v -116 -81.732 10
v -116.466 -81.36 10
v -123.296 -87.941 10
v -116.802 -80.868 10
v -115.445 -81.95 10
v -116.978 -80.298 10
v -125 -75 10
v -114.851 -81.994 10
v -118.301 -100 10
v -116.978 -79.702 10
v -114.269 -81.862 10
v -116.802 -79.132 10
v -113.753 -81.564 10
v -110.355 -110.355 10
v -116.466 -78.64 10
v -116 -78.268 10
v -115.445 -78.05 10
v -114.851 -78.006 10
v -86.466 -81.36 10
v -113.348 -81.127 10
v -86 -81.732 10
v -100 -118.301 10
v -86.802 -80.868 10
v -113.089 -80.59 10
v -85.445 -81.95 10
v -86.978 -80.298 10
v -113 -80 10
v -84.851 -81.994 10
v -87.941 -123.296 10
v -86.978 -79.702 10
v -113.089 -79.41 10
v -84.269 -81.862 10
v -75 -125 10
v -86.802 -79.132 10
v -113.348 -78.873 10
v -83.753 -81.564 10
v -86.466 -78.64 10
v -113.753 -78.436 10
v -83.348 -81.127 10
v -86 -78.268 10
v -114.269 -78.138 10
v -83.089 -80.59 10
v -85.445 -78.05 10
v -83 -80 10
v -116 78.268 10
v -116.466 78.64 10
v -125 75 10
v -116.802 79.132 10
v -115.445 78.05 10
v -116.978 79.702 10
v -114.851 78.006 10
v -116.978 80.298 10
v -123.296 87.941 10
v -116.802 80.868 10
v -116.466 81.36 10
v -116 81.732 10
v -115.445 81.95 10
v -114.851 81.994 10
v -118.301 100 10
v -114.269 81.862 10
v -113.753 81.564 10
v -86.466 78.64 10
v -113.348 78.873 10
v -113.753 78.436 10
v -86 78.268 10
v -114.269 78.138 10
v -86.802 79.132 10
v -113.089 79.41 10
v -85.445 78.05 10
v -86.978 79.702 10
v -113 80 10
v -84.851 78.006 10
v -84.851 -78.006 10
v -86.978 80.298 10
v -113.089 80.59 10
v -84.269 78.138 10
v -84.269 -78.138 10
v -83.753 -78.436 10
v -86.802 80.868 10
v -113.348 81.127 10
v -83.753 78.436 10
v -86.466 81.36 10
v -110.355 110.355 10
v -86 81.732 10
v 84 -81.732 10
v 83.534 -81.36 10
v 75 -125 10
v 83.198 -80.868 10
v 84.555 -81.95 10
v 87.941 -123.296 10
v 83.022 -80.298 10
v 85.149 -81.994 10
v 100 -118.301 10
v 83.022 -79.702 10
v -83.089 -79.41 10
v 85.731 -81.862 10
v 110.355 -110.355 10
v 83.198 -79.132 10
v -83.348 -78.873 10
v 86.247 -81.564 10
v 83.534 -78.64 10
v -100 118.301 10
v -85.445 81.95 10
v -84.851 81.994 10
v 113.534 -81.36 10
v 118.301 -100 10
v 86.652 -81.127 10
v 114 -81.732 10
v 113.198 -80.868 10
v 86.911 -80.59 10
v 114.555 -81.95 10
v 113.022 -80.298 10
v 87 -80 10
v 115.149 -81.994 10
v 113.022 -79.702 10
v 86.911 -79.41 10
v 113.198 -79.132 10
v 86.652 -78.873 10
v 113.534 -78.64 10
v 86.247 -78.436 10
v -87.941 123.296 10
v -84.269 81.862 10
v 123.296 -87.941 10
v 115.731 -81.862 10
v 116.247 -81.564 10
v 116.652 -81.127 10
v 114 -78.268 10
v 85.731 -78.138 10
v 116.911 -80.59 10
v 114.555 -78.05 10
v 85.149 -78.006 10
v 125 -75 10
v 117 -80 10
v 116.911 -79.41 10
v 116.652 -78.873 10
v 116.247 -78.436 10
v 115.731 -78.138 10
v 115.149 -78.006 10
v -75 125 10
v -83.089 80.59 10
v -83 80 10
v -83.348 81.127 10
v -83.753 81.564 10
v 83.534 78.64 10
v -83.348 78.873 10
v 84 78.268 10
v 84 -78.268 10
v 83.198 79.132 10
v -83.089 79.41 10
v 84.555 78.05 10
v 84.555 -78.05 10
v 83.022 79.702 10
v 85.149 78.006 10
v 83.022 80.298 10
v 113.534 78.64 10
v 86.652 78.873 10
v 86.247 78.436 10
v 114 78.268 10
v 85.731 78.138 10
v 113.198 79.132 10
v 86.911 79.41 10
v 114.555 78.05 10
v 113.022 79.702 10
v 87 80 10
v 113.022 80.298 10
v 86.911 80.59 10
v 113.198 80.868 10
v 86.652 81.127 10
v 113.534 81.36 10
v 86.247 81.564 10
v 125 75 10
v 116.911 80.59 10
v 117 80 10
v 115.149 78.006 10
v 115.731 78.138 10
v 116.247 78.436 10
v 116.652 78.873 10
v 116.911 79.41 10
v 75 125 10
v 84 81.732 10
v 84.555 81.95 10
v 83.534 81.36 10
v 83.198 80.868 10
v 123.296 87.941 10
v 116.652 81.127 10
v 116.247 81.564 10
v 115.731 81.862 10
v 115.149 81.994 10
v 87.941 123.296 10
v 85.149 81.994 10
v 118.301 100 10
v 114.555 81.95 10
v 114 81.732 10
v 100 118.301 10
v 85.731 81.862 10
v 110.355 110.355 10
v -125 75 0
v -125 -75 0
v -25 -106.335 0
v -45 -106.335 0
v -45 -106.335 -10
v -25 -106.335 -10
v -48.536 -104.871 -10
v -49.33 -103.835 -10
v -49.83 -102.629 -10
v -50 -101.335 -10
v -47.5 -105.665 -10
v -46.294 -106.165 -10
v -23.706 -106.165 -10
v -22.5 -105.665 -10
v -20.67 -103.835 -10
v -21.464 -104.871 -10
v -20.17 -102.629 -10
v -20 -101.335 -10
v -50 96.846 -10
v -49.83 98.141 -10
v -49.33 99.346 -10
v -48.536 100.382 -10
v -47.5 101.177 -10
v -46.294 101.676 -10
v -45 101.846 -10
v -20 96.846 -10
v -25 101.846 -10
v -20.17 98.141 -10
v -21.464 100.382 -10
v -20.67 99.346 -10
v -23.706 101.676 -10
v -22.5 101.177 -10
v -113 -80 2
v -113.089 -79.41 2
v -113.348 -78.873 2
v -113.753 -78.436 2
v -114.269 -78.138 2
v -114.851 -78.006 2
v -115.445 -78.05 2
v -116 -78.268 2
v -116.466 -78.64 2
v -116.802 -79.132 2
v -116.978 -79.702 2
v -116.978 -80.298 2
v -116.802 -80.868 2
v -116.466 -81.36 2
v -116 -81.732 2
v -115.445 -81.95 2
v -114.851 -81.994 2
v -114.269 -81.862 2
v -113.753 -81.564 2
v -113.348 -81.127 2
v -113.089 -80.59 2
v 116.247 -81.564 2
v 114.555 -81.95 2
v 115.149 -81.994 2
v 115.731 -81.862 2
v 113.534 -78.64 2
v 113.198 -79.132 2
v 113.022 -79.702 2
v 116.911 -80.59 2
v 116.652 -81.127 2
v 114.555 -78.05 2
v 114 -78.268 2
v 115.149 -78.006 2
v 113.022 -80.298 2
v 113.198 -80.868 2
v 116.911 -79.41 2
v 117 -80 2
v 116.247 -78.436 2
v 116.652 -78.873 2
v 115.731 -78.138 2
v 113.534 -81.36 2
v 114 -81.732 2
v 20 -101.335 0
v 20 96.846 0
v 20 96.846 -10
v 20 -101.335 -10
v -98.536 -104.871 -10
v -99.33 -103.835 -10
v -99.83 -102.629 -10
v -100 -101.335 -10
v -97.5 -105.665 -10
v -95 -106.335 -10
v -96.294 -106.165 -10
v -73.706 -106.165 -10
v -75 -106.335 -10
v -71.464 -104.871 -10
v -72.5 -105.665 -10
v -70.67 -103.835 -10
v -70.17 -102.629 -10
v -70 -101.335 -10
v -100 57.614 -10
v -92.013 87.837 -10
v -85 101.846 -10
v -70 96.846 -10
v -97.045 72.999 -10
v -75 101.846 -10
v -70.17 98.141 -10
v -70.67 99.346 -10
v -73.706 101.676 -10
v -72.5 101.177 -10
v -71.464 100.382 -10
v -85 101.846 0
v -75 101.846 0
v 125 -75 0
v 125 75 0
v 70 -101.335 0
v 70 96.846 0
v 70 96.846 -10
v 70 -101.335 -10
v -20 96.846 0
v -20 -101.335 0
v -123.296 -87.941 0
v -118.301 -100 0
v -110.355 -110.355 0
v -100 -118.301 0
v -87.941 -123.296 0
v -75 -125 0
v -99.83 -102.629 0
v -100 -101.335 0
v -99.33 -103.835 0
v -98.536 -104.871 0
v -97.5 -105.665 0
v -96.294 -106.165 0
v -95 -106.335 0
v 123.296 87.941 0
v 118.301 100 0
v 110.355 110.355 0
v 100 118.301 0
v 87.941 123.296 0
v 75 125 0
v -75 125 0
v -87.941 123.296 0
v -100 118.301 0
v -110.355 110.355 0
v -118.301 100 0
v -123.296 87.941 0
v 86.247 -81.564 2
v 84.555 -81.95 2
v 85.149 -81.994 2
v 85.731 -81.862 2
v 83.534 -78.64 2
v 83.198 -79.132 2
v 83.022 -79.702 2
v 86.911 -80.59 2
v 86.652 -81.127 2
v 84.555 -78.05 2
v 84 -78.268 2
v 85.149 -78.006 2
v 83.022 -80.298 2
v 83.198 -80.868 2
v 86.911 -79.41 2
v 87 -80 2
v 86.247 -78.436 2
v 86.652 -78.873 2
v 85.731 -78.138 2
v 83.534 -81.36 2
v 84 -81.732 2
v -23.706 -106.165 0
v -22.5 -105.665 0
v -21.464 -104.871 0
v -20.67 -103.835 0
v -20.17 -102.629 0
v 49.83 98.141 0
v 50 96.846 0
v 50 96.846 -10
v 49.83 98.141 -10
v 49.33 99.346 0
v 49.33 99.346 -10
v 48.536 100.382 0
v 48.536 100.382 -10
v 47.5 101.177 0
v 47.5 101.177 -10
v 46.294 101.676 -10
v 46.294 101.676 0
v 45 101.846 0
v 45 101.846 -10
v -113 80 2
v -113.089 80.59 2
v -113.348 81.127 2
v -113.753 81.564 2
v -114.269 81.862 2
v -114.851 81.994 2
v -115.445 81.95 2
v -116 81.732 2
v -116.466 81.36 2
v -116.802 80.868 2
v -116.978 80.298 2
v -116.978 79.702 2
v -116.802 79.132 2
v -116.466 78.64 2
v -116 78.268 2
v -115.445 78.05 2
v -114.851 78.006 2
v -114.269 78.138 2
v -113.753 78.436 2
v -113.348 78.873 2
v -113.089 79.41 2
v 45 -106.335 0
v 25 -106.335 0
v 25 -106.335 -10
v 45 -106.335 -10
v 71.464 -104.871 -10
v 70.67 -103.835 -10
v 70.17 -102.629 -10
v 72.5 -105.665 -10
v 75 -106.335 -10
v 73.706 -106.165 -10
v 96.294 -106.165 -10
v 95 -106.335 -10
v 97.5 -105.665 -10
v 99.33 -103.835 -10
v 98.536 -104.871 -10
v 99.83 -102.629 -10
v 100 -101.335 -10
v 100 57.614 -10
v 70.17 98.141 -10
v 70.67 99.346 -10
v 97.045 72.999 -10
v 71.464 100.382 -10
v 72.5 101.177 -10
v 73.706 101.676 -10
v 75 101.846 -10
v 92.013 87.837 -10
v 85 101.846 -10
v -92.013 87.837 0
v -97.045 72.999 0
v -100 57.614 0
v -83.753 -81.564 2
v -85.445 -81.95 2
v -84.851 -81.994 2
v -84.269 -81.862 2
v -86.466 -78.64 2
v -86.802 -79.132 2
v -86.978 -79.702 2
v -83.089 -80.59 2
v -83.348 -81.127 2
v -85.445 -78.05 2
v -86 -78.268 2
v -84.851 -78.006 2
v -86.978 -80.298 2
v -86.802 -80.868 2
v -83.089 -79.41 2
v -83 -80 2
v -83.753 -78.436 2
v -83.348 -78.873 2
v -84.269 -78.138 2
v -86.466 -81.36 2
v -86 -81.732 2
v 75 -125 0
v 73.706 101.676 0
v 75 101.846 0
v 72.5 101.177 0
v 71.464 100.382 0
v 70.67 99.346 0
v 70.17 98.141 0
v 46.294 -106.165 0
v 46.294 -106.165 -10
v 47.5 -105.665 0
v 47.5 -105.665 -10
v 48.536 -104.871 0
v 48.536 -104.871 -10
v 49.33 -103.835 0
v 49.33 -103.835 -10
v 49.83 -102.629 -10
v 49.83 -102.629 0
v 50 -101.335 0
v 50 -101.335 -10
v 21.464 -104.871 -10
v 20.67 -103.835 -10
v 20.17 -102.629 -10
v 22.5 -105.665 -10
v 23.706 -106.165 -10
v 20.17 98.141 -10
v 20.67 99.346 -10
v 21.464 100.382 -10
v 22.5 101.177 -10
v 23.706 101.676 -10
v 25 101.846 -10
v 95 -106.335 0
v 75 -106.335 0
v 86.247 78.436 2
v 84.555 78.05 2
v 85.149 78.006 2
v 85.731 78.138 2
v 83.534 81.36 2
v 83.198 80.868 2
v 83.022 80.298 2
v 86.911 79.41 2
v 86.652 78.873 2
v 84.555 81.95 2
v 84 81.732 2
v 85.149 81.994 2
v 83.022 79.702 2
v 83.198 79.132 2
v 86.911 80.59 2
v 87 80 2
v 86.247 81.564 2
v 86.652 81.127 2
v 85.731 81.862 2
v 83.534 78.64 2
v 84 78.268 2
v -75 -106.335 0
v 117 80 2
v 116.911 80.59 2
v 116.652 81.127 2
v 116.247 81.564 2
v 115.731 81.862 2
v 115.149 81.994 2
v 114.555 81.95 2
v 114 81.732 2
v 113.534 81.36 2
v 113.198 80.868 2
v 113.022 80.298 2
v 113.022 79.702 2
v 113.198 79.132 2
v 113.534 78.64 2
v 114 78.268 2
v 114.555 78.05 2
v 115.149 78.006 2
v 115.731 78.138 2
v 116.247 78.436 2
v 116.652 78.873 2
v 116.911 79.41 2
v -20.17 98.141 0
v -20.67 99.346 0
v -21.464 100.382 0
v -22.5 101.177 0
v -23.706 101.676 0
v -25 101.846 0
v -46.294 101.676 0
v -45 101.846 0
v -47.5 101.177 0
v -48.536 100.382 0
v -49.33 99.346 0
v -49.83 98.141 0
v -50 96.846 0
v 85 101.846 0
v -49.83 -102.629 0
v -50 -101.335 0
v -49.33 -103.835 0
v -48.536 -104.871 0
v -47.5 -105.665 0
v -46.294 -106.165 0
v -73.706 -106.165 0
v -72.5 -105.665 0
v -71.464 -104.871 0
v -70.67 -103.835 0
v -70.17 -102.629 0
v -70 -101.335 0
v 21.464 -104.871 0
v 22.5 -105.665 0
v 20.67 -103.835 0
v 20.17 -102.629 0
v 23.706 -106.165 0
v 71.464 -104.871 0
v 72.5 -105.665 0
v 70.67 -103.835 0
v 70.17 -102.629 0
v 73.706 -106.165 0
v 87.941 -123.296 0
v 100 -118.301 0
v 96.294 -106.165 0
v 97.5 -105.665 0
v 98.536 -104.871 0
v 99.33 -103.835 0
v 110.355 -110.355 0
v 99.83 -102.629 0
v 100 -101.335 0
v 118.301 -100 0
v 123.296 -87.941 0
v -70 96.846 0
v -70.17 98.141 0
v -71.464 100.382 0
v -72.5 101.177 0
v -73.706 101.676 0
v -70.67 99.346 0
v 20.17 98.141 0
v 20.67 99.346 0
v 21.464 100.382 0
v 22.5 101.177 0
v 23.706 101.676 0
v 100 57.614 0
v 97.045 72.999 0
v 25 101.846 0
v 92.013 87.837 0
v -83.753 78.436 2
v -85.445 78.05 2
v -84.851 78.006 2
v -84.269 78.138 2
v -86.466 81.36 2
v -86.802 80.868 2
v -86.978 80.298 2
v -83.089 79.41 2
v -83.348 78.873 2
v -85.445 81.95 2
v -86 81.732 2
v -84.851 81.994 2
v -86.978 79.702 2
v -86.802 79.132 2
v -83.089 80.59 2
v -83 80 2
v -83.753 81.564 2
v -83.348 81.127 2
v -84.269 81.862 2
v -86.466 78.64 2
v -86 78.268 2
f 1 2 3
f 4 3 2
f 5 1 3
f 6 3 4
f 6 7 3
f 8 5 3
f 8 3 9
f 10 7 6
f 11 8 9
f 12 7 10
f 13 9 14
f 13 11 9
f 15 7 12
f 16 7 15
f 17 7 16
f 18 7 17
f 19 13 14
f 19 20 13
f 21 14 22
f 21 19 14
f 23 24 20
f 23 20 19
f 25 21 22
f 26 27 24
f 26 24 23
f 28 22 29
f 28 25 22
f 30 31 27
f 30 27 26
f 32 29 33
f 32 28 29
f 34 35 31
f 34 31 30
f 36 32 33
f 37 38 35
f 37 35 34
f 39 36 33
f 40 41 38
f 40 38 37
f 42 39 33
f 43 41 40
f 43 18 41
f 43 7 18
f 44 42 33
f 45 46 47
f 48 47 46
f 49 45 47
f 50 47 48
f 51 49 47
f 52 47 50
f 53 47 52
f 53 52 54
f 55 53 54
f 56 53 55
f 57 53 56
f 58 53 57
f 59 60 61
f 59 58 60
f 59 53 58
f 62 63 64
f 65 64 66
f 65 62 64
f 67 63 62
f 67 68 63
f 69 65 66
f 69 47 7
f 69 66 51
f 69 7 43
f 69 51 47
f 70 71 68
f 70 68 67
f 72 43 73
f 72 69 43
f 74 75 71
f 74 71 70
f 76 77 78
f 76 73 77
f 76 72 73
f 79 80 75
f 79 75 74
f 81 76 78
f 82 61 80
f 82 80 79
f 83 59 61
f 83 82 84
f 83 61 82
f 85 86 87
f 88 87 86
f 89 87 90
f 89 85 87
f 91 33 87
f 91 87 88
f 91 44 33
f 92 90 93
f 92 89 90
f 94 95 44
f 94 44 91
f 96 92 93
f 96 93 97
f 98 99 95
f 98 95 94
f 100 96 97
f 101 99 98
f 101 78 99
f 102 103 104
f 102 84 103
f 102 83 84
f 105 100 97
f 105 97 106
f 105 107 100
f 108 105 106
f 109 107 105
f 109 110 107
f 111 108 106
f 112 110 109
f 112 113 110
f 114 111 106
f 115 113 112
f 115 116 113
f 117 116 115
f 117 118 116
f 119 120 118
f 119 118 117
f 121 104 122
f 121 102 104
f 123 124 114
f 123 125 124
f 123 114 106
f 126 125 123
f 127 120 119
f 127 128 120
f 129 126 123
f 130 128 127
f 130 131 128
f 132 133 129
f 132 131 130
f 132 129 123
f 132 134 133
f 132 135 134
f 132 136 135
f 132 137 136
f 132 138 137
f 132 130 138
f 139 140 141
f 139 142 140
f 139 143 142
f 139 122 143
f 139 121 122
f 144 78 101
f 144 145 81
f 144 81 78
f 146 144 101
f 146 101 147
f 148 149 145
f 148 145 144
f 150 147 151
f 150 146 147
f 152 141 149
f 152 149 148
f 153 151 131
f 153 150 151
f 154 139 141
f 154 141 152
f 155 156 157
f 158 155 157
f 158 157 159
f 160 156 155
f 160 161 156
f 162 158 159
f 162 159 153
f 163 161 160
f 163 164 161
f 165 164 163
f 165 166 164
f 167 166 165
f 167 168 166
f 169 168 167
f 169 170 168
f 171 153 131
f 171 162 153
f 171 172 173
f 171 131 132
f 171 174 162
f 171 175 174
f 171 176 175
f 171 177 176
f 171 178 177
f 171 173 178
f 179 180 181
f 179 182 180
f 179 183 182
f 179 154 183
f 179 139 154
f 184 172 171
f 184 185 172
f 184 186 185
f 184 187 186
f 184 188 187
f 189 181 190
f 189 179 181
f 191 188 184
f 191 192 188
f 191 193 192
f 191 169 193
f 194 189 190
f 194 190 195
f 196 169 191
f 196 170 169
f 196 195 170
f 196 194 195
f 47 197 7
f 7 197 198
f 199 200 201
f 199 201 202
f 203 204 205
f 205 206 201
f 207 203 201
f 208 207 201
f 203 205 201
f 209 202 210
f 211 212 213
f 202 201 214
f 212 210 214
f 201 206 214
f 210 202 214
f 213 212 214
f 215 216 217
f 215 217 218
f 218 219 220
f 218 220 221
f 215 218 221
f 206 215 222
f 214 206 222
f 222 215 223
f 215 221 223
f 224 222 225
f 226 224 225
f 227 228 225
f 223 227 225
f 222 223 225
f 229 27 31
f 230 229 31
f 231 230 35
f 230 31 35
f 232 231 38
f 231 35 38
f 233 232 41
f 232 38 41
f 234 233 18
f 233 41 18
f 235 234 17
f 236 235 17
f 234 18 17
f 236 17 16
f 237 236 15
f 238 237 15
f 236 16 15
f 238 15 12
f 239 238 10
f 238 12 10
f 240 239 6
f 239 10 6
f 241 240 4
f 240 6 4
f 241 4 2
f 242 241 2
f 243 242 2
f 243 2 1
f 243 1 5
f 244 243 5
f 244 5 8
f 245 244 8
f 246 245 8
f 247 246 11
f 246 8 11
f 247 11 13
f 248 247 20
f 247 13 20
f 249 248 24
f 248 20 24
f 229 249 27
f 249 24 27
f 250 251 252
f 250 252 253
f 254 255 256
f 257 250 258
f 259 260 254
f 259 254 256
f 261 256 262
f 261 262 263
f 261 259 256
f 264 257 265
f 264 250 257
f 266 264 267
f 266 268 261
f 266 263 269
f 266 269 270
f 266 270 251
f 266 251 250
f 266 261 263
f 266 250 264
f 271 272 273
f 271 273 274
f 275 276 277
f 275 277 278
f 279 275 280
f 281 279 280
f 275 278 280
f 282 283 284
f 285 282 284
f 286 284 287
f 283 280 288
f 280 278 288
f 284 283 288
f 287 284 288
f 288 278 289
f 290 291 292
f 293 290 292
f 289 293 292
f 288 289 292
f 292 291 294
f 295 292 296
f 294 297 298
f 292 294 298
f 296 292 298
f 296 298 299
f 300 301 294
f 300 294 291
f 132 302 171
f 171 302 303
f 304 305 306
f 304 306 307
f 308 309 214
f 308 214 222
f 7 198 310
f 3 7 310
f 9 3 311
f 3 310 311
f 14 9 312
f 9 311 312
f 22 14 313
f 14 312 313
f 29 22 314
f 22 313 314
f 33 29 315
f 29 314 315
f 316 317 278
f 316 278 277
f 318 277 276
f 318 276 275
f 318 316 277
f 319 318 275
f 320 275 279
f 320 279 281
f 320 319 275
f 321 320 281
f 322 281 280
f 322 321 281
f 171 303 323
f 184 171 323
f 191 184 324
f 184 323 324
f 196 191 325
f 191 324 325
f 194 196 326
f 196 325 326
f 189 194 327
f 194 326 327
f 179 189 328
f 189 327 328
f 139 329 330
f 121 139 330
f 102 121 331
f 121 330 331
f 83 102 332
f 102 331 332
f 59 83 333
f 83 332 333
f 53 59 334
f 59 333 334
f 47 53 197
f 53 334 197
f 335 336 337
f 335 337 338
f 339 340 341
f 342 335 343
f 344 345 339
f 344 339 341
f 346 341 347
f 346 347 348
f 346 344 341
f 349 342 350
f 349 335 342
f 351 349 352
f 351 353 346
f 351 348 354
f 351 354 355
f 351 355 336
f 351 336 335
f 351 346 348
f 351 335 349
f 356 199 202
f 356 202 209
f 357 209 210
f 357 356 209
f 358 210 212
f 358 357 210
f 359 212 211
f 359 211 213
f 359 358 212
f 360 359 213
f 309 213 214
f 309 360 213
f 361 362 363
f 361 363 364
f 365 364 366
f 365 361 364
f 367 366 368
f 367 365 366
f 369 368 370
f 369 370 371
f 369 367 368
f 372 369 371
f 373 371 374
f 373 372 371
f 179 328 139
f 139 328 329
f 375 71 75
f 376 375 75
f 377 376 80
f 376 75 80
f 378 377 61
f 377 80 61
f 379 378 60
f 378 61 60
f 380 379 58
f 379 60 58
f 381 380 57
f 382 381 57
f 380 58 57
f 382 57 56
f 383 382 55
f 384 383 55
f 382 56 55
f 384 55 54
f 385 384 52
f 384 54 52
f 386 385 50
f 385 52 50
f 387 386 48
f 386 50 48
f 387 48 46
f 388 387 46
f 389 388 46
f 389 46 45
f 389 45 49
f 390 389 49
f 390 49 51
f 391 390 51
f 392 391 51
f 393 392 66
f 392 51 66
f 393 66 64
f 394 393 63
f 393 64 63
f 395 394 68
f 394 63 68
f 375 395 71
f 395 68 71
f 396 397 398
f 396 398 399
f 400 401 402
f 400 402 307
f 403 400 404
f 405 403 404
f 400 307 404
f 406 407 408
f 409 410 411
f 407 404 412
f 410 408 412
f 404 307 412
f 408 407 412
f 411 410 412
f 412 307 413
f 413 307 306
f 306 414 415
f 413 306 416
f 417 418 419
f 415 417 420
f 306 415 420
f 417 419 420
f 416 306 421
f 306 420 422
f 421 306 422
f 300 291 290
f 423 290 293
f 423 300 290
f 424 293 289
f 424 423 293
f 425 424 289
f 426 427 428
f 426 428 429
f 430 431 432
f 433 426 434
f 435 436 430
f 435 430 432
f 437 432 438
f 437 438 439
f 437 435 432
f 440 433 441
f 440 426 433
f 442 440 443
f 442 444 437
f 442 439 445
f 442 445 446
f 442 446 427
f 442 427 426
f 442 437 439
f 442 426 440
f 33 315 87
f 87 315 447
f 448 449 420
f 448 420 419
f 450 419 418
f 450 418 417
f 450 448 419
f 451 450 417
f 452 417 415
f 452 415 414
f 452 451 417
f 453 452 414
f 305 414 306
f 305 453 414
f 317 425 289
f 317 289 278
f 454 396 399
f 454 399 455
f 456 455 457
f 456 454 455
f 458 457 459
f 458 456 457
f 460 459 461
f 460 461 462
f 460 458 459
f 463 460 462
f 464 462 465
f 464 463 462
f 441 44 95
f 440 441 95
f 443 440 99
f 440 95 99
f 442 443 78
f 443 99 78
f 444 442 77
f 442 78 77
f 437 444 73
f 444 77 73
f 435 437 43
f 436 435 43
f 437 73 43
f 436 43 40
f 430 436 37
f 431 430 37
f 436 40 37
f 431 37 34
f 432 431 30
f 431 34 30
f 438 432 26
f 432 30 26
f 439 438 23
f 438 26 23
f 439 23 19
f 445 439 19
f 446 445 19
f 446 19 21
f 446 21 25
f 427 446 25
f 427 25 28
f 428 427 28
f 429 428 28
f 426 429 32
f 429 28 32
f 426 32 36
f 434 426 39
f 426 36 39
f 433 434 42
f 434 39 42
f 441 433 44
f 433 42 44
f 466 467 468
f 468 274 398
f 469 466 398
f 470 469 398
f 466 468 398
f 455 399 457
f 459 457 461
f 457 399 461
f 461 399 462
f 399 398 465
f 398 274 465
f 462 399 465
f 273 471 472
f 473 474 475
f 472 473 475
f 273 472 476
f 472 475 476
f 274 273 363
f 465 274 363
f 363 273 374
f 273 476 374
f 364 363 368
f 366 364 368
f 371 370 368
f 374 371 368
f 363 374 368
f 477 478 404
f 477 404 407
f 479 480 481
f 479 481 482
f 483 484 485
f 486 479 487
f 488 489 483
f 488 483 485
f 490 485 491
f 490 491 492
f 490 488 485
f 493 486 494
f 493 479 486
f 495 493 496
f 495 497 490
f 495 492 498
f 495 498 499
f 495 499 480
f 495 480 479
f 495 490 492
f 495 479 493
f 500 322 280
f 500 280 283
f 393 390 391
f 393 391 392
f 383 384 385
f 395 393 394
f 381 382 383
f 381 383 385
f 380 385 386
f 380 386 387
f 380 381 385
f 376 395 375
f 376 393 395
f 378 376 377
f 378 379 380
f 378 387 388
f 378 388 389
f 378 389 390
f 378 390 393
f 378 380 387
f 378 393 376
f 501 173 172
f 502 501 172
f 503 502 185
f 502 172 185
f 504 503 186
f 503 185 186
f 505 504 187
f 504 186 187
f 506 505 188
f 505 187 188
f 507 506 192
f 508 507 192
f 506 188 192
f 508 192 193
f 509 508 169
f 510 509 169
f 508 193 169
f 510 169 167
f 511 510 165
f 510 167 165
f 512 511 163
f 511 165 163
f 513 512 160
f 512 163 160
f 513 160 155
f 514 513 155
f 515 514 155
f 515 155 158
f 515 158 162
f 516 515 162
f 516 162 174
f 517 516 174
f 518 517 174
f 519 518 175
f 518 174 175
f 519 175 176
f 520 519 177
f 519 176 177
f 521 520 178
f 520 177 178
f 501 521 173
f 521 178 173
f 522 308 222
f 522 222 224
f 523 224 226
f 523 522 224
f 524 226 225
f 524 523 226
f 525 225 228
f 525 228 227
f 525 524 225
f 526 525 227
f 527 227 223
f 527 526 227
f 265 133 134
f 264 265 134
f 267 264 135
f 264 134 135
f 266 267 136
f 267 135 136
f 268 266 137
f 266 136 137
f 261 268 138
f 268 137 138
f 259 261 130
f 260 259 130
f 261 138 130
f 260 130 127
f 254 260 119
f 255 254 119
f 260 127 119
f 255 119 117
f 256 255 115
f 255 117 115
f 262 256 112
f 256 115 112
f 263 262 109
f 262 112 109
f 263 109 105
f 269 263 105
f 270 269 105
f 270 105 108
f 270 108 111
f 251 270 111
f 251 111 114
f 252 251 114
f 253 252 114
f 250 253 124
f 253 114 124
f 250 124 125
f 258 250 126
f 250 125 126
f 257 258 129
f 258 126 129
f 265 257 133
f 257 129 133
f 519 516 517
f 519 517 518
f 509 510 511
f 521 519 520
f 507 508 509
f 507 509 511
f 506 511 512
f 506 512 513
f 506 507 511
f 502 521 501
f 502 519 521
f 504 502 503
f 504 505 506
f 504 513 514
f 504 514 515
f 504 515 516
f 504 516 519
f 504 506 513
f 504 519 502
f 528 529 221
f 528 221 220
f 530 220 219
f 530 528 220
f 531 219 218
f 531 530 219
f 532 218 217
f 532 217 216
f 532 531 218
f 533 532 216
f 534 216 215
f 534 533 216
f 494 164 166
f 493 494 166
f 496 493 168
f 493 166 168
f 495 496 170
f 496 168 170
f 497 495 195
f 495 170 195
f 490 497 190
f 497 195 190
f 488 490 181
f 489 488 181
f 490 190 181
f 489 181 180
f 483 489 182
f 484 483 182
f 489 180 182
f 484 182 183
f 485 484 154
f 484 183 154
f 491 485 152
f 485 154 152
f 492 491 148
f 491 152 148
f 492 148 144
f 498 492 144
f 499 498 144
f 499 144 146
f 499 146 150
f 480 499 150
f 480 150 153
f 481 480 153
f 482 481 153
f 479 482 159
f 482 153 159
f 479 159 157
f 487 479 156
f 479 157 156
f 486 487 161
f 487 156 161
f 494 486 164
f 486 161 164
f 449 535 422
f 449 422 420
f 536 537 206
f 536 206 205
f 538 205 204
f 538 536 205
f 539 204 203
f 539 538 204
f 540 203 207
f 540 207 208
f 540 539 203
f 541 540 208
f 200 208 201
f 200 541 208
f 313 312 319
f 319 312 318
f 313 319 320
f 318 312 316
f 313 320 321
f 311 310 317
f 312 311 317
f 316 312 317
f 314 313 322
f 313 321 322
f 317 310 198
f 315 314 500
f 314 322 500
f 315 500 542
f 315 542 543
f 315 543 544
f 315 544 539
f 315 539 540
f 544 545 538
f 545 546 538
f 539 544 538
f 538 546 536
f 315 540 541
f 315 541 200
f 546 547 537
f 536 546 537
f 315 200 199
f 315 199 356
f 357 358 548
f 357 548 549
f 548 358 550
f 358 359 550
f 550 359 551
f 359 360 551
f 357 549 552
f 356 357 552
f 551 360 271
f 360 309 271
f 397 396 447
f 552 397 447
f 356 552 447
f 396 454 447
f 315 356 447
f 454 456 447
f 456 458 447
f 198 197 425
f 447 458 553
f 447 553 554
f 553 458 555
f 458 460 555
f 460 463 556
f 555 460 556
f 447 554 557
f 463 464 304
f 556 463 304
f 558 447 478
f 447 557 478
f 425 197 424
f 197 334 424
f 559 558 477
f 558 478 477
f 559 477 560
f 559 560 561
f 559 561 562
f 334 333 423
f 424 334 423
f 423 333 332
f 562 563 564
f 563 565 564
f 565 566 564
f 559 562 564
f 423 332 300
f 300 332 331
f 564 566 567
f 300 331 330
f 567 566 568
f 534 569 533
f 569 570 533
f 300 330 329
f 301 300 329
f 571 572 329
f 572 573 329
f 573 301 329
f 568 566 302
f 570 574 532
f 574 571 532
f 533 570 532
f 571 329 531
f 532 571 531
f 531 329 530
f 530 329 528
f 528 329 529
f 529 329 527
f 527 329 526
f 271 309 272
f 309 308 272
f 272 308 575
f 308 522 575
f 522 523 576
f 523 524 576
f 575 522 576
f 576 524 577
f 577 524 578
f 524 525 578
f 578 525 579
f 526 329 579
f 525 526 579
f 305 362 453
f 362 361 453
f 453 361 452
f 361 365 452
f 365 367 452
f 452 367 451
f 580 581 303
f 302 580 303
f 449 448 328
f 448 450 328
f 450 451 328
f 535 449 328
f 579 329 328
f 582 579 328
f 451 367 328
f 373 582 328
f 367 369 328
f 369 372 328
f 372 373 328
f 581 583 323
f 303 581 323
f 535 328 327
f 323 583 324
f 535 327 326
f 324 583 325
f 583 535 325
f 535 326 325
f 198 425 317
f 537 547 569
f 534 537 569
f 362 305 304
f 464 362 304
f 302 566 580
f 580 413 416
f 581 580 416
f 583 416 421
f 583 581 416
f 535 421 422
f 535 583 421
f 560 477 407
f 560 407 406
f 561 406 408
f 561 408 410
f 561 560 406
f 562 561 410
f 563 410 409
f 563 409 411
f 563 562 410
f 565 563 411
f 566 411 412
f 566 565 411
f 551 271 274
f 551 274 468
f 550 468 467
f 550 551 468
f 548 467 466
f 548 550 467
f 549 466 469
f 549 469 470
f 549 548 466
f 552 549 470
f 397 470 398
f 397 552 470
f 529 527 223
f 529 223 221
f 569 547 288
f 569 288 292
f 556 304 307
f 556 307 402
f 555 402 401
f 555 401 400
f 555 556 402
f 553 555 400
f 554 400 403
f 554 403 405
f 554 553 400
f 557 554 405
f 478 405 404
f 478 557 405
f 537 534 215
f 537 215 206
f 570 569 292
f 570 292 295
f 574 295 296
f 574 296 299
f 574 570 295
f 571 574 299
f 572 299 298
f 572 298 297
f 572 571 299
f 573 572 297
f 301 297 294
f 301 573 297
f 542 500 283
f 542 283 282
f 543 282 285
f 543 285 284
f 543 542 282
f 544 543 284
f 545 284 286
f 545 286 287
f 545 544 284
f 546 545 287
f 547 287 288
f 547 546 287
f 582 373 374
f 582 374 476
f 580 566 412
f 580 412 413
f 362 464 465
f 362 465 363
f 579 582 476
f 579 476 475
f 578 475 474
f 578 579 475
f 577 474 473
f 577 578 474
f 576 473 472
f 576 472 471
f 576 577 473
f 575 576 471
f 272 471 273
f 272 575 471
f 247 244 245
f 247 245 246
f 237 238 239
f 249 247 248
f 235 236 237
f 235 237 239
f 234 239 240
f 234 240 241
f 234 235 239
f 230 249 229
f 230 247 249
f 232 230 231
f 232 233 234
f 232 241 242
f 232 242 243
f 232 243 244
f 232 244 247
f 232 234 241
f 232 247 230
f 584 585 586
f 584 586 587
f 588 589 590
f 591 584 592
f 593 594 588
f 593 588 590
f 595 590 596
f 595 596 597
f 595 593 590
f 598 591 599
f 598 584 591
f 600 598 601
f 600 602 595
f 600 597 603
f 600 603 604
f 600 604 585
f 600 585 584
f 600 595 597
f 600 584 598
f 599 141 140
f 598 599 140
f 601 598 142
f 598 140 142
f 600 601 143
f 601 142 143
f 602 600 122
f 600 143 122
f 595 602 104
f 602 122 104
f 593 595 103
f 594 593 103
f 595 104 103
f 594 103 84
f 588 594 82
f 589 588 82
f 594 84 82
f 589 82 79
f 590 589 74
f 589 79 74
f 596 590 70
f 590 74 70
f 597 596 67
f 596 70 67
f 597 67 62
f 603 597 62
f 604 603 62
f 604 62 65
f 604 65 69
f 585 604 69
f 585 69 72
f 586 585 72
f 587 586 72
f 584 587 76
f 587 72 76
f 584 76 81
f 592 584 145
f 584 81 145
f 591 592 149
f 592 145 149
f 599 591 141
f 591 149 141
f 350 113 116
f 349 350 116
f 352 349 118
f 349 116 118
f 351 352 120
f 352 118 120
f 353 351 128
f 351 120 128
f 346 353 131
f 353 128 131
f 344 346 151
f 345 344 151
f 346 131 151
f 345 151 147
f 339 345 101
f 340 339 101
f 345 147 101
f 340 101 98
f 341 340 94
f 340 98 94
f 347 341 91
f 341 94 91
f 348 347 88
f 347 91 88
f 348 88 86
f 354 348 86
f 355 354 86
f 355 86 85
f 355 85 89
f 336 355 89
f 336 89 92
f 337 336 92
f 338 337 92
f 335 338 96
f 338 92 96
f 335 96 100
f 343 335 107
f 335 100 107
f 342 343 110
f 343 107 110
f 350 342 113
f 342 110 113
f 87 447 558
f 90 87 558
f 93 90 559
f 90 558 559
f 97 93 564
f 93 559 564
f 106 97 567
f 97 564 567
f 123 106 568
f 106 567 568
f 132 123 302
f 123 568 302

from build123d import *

# Parameters (mm, degrees)
EXTRUDE_1_DEPTH     = 10
SKETCH_2_R          = 2
CUT_EXTRUDE_1_DEPTH = 8
EXTRUDE_2_DEPTH     = 10


with BuildPart() as part:
    # 草图1 → 凸台-拉伸1 (new body)
    with BuildSketch(Plane.XY):
        with BuildLine():
            Line((-75, -125), (75, -125))
            ThreePointArc((75, -125), (110.355339059, -110.355339059), (125, -75))
            Line((125, -75), (125, 75))
            ThreePointArc((125, 75), (110.355339059, 110.355339059), (75, 125))
            Line((75, 125), (-75, 125))
            ThreePointArc((-75, 125), (-110.355339059, 110.355339059), (-125, 75))
            Line((-125, 75), (-125, -75))
            ThreePointArc((-125, -75), (-110.355339059, -110.355339059), (-75, -125))
        make_face()
    extrude(amount=EXTRUDE_1_DEPTH)

    # 草图2 → 切除-拉伸1 (cut)
    with BuildSketch(Plane.XY.offset(10)):
        with Locations((115, 80)):
            Circle(SKETCH_2_R)
        with Locations((85, 80)):
            Circle(SKETCH_2_R)
        with Locations((115, -80)):
            Circle(SKETCH_2_R)
        with Locations((85, -80)):
            Circle(SKETCH_2_R)
        with Locations((-115, -80)):
            Circle(SKETCH_2_R)
        with Locations((-85, -80)):
            Circle(SKETCH_2_R)
        with Locations((-85, 80)):
            Circle(SKETCH_2_R)
        with Locations((-115, 80)):
            Circle(SKETCH_2_R)
    extrude(amount=-CUT_EXTRUDE_1_DEPTH, mode=Mode.SUBTRACT)

    # 草图3 → 凸台-拉伸2 (add)
    with BuildSketch(Plane(origin=(0, 0, 0), x_dir=(-1, 0, 0), z_dir=(0, 0, -1))):
        with BuildLine():
            Line((-20, 96.846443928), (-20, -101.335336728))
            ThreePointArc((-20, -101.335336728), (-21.464466094, -104.870870634), (-25, -106.335336728))
            Line((-25, -106.335336728), (-45, -106.335336728))
            ThreePointArc((-45, -106.335336728), (-48.535533906, -104.870870634), (-50, -101.335336728))
            Line((-50, -101.335336728), (-50, 96.846443928))
            ThreePointArc((-50, 96.846443928), (-48.535533906, 100.381977834), (-45, 101.846443928))
            Line((-45, 101.846443928), (-25, 101.846443928))
            ThreePointArc((-25, 101.846443928), (-21.464466094, 100.381977834), (-20, 96.846443928))
        make_face()
        with BuildLine():
            Line((-70, 96.846443928), (-70, -101.335336728))
            ThreePointArc((-70, -101.335336728), (-71.464466094, -104.870870634), (-75, -106.335336728))
            Line((-75, -106.335336728), (-95, -106.335336728))
            ThreePointArc((-95, -106.335336728), (-98.535533906, -104.870870634), (-100, -101.335336728))
            Line((-100, -101.335336728), (-100, 57.613560287))
            ThreePointArc((-100, 57.613560287), (-94.783283784, 80.504296116), (-85, 101.846443928))
            Line((-85, 101.846443928), (-75, 101.846443928))
            ThreePointArc((-75, 101.846443928), (-71.464466094, 100.381977834), (-70, 96.846443928))
        make_face()
        with BuildLine():
            Line((45, -106.335336728), (25, -106.335336728))
            ThreePointArc((25, -106.335336728), (21.464466094, -104.870870634), (20, -101.335336728))
            Line((20, -101.335336728), (20, 96.846443928))
            ThreePointArc((20, 96.846443928), (21.464466094, 100.381977834), (25, 101.846443928))
            Line((25, 101.846443928), (45, 101.846443928))
            ThreePointArc((45, 101.846443928), (48.535533906, 100.381977834), (50, 96.846443928))
            Line((50, 96.846443928), (50, -101.335336728))
            ThreePointArc((50, -101.335336728), (48.535533906, -104.870870634), (45, -106.335336728))
        make_face()
        with BuildLine():
            Line((95, -106.335336728), (75, -106.335336728))
            ThreePointArc((75, -106.335336728), (71.464466094, -104.870870634), (70, -101.335336728))
            Line((70, -101.335336728), (70, 96.846443928))
            ThreePointArc((70, 96.846443928), (71.464466094, 100.381977834), (75, 101.846443928))
            Line((75, 101.846443928), (85, 101.846443928))
            ThreePointArc((85, 101.846443928), (94.783283784, 80.504296116), (100, 57.613560287))
            Line((100, 57.613560287), (100, -101.335336728))
            ThreePointArc((100, -101.335336728), (98.535533906, -104.870870634), (95, -106.335336728))
        make_face()
    extrude(amount=EXTRUDE_2_DEPTH)


solid = part.part
